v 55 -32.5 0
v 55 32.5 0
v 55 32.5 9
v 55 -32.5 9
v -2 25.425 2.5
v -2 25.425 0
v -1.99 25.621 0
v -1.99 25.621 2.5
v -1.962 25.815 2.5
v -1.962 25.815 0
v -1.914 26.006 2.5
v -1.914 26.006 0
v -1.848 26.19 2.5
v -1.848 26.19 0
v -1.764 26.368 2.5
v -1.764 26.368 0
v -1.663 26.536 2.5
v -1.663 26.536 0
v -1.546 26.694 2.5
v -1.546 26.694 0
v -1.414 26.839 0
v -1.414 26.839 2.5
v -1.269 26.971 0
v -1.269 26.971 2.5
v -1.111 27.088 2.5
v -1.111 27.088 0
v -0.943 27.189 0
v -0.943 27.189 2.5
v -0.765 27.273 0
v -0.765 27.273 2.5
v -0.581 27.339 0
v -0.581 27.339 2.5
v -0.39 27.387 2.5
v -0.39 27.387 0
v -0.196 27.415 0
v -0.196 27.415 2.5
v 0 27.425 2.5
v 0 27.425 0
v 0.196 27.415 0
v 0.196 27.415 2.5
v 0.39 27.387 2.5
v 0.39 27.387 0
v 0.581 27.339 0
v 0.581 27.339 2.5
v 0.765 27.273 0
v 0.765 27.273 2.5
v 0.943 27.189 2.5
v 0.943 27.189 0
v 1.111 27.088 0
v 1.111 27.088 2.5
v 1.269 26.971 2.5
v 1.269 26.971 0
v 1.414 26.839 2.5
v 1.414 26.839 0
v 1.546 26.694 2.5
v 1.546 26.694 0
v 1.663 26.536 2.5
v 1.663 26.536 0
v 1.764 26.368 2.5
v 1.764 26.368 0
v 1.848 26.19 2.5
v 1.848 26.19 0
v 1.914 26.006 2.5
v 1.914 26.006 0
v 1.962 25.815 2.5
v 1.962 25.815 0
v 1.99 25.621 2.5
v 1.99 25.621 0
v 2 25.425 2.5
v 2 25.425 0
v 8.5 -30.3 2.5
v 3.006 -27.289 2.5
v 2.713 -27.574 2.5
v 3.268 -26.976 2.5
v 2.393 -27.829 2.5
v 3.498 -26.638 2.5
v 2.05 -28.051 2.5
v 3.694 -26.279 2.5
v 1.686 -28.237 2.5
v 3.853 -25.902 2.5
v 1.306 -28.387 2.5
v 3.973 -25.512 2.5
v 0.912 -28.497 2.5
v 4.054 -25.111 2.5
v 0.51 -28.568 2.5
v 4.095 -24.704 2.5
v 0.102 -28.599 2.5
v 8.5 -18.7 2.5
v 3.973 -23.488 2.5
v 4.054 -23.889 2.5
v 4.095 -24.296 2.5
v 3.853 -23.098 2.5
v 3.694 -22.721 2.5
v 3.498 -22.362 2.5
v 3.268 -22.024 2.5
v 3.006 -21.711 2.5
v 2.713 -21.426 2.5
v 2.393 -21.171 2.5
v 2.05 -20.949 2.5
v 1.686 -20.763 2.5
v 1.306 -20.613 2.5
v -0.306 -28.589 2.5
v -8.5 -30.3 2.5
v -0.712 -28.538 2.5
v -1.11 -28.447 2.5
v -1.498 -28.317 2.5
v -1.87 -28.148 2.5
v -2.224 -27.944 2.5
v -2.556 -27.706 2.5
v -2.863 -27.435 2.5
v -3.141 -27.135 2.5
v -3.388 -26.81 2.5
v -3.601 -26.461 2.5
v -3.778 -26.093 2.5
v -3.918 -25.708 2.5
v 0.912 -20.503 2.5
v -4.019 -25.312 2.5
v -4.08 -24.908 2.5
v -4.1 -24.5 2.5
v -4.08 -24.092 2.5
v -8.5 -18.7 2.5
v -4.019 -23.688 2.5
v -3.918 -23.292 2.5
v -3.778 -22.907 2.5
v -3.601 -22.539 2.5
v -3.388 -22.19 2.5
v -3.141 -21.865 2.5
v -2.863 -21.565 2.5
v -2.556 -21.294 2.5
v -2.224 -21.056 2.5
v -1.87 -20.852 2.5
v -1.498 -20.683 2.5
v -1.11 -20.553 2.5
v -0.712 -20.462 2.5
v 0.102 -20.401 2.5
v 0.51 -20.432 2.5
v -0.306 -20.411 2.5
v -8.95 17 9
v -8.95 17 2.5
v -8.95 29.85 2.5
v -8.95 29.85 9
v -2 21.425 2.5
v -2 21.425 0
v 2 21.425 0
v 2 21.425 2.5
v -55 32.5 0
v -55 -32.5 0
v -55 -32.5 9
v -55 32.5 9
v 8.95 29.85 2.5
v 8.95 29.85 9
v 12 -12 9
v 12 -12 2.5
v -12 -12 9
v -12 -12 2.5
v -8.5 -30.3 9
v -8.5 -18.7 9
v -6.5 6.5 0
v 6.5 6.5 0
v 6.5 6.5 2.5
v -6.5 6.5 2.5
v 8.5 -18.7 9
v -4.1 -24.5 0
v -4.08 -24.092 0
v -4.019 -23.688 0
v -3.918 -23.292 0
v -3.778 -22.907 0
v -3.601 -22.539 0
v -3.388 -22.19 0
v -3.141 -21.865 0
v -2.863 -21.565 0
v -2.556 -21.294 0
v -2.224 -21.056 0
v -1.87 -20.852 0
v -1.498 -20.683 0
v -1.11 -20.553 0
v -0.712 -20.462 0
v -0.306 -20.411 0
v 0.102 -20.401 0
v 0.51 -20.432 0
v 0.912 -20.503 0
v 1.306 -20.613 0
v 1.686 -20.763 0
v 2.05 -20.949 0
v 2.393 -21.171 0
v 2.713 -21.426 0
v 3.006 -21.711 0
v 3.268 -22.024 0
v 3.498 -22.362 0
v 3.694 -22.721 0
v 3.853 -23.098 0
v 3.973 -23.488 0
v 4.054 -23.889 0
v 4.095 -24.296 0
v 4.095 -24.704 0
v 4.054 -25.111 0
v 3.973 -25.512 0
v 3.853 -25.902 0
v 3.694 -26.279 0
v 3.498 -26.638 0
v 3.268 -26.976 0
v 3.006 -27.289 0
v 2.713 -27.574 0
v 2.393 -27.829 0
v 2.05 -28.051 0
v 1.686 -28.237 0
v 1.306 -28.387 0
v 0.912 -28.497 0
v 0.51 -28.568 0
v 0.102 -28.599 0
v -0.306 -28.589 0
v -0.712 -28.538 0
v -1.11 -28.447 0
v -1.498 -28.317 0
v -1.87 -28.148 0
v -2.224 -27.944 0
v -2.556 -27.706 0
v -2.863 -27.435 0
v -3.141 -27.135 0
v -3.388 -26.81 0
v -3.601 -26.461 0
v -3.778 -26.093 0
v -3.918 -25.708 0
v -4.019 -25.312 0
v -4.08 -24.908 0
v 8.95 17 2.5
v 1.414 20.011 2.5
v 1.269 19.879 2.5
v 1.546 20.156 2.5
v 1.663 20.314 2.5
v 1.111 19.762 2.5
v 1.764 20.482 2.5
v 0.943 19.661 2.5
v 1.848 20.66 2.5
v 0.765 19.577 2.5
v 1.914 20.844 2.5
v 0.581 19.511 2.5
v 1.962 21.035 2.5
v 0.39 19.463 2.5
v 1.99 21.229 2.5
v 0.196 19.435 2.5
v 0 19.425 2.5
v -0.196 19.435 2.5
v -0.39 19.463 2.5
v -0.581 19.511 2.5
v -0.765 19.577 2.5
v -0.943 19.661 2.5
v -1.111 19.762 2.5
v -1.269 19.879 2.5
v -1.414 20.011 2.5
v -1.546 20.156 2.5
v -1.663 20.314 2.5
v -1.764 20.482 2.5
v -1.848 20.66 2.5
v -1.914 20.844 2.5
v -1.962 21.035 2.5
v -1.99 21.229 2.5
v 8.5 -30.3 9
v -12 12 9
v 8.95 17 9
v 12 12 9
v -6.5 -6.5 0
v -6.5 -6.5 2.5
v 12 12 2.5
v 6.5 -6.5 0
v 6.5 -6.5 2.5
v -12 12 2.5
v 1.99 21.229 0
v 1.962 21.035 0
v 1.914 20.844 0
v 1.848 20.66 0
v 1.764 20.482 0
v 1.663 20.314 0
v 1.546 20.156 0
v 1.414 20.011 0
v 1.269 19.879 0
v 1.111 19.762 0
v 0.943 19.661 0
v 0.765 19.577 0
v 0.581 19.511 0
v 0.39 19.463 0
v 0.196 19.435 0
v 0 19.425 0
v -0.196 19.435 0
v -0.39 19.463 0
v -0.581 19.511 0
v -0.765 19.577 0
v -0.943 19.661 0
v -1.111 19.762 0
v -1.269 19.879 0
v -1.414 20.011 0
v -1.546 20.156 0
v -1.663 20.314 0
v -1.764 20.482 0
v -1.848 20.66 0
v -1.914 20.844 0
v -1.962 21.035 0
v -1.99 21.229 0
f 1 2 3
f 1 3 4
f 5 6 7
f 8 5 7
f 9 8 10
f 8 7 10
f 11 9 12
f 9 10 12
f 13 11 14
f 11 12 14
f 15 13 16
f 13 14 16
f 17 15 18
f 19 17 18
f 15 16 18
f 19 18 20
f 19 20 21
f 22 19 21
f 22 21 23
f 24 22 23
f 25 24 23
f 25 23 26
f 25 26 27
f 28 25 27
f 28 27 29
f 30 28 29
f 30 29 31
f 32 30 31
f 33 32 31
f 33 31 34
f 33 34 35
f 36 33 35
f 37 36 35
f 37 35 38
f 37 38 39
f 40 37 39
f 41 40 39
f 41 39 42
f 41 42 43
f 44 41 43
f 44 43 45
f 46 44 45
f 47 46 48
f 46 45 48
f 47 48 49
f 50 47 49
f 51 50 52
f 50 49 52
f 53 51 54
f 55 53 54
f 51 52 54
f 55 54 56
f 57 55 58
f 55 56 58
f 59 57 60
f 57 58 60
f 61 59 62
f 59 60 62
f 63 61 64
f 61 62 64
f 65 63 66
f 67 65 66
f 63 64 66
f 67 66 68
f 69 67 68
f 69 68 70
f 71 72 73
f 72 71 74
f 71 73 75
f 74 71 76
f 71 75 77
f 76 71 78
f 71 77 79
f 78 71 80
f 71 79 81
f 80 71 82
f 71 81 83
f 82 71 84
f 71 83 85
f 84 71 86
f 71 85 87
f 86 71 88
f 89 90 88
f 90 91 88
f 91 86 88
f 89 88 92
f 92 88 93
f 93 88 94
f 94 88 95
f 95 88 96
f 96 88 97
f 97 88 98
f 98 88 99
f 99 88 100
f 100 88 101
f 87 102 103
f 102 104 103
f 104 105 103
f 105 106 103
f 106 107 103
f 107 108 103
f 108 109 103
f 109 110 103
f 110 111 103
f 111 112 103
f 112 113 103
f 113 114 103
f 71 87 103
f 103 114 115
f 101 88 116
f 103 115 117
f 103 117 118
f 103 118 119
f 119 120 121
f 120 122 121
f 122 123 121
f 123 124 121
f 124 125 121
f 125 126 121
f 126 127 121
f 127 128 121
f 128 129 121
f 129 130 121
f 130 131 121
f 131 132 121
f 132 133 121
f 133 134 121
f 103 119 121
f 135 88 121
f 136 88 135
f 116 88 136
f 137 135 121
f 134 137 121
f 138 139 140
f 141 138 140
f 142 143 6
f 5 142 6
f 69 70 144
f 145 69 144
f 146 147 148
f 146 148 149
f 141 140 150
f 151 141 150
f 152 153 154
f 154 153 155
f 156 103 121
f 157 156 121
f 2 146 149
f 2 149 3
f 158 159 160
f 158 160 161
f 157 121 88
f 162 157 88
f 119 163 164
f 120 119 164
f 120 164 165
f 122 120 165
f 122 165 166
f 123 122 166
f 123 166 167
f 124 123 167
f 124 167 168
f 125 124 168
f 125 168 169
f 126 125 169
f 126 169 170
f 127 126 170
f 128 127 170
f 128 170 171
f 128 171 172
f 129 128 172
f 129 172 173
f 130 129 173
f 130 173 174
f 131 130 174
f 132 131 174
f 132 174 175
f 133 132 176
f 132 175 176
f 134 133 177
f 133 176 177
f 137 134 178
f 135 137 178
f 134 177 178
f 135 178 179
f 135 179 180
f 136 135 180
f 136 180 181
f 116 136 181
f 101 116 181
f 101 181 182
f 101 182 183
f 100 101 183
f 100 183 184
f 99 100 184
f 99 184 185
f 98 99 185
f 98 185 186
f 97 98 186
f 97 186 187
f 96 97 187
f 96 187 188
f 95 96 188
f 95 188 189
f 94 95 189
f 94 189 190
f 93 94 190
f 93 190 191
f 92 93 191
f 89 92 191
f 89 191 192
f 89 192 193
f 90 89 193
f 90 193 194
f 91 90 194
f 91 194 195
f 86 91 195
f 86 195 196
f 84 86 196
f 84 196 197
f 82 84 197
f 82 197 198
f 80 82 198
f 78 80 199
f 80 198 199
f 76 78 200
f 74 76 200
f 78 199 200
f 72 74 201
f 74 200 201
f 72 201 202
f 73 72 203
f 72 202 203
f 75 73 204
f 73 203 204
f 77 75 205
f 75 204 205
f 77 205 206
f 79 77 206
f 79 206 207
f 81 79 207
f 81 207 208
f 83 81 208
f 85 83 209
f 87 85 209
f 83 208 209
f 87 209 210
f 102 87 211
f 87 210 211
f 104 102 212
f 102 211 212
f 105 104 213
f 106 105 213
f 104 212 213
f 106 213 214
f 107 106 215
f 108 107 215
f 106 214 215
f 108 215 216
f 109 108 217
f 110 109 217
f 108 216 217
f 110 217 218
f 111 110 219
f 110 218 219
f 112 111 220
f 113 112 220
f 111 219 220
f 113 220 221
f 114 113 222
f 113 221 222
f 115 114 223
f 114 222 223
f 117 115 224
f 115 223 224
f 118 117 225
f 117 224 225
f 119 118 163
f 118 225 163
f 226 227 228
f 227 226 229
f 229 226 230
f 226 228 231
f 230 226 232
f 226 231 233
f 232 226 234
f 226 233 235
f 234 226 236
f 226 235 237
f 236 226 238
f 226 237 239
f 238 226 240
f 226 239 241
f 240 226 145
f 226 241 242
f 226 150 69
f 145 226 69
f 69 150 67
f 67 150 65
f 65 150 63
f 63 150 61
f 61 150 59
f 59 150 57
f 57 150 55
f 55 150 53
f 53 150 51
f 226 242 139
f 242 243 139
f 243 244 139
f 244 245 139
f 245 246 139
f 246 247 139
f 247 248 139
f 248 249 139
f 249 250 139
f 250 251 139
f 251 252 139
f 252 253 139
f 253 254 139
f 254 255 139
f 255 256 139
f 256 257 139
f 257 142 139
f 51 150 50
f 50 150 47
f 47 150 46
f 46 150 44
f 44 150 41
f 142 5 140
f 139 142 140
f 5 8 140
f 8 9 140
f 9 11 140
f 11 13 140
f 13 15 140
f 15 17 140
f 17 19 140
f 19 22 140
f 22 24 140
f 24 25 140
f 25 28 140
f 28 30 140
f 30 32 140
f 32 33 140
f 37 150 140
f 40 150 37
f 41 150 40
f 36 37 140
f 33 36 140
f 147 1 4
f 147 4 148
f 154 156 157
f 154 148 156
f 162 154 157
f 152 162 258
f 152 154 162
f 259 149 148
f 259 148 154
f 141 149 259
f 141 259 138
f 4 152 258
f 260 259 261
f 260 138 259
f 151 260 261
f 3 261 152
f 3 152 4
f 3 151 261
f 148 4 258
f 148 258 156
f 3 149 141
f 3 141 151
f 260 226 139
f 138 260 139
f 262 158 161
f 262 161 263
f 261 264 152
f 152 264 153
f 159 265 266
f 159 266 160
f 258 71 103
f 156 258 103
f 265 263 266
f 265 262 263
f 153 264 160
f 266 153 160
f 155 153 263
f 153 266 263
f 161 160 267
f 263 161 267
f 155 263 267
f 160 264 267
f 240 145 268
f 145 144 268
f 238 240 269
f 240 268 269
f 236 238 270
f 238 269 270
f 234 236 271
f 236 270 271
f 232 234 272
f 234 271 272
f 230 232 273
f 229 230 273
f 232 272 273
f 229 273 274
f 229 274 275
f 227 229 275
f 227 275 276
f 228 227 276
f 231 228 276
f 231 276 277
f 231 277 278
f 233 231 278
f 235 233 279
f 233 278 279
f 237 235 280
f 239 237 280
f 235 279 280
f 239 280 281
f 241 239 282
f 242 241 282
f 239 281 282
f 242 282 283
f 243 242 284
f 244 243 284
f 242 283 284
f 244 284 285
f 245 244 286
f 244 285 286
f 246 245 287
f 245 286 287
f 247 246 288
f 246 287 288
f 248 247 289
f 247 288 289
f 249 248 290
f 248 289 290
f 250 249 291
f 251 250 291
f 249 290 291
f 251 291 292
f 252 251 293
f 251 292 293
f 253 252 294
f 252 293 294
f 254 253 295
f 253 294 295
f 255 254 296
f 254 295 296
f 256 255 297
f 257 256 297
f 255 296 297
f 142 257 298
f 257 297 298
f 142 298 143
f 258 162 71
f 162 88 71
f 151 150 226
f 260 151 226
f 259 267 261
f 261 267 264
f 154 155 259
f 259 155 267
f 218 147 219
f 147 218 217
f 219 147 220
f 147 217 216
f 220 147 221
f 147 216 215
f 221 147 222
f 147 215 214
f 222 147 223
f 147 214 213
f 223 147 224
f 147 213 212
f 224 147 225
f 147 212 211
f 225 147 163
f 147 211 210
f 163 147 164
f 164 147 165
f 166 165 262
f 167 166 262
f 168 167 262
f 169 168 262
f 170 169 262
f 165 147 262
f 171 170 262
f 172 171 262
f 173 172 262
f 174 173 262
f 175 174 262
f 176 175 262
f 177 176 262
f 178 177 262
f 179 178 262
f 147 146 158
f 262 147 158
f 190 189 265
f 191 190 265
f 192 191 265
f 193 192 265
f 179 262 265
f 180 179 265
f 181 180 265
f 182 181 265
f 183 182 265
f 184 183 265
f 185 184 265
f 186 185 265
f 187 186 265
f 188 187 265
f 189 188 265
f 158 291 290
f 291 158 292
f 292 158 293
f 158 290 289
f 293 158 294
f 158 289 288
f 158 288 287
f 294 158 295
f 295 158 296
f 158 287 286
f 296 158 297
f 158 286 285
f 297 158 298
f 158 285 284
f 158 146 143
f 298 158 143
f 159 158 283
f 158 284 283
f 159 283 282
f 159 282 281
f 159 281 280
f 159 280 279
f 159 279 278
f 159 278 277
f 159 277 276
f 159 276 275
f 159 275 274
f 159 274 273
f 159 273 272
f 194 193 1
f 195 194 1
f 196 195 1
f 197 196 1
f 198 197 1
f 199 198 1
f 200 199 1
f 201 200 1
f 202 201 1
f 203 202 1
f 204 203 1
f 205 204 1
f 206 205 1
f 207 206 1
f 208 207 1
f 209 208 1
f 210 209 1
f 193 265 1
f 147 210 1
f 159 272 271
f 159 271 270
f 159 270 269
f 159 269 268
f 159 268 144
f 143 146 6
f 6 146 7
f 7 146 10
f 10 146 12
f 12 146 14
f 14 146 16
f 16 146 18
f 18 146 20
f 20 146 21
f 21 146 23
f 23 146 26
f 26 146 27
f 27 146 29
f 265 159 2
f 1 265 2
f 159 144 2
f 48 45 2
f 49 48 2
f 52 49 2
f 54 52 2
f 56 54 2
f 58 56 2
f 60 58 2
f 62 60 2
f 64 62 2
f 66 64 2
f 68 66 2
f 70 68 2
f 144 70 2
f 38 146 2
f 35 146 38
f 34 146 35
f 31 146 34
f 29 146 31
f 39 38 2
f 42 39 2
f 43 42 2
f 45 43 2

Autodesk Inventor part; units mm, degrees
ref_plane "YZ Plane" through (0, 0, 0) normal (1, 0, 0) x (0, 1, 0)
ref_plane "XZ Plane" through (0, 0, 0) normal (0, 1, 0) x (-1, 0, 0)
ref_plane "XY Plane" through (0, 0, 0) normal (0, 0, 1) x (1, 0, 0)
sketch "Schizzo1" plane through (0, 0, 0) normal (0, 0, 1) x (1, 0, 0)
  line L0 (-55, 32.5) -> (55, 32.5)
  line L1 (55, 32.5) -> (55, -32.5)
  line L2 (55, -32.5) -> (-55, -32.5)
  line L3 (-55, -32.5) -> (-55, 32.5)
  line L4 (-55, 32.5) -> (55, -32.5) construction
  line L5 (55, 32.5) -> (-55, -32.5) construction
  line L6 (-8.5, -18.7) -> (8.5, -18.7)
  line L7 (8.5, -18.7) -> (8.5, -30.3)
  line L8 (8.5, -30.3) -> (-8.5, -30.3)
  line L9 (-8.5, -30.3) -> (-8.5, -18.7)
  line L10 (-8.5, -18.7) -> (8.5, -30.3) construction
  line L11 (8.5, -18.7) -> (-8.5, -30.3) construction
  line L12 (-12, 12) -> (12, 12)
  line L13 (12, 12) -> (12, -12)
  line L14 (12, -12) -> (-12, -12)
  line L15 (-12, -12) -> (-12, 12)
  line L16 (-12, 12) -> (12, -12) construction
  line L17 (12, 12) -> (-12, -12) construction
  line L18 (-8.95, 29.85) -> (8.95, 29.85)
  line L19 (8.95, 29.85) -> (8.95, 17)
  line L20 (8.95, 17) -> (-8.95, 17)
  line L21 (-8.95, 17) -> (-8.95, 29.85)
  line L22 (-8.95, 29.85) -> (8.95, 17) construction
  line L23 (8.95, 29.85) -> (-8.95, 17) construction
  line L24 (0, 25.425) -> (0, 21.425) construction
  line L25 (-2, 25.425) -> (-2, 21.425)
  line L26 (2, 21.425) -> (2, 25.425)
  arc A0 (2, 25.425) -> (-2, 25.425) centre (0, 25.425) ccw
  arc A1 (-2, 21.425) -> (2, 21.425) centre (0, 21.425) ccw
  circle A2 centre (0, -24.5) radius 4.1
  circle A3 centre (0, 0) radius 3.8
  line L27 (-4, 4) -> (4, 4)
  line L28 (4, 4) -> (4, -4)
  line L29 (4, -4) -> (-4, -4)
  line L30 (-4, -4) -> (-4, 4)
  line L31 (-4, 4) -> (4, -4) construction
  line L32 (4, 4) -> (-4, -4) construction
  point P0 (0, 23.425)
  dimension "d0" = 110
  dimension "d1" = 65
  dimension "d5" = 17
  dimension "d6" = 11.6
  dimension "d8" = 24
  dimension "d9" = 24
  dimension "d11" = 17.9
  dimension "d12" = 12.85
  dimension "d13" = 2
  dimension "d14" = 4
  dimension "d15" = 8.2
  dimension "d16" = 7.6
  dimension "d17" = 8
  dimension "d18" = 8
extrude "Estrusione1" add sketch "Schizzo1" along normal blind 9 contours L0 L1 L2 L3
sketch "Schizzo2" plane through (0, 0, 0) normal (0, 0, -1) x (-1, 0, 0)
  line L0 (-55, 32.5) -> (55, 32.5)
  line L1 (55, 32.5) -> (55, -32.5)
  line L2 (55, -32.5) -> (-55, -32.5)
  line L3 (-55, -32.5) -> (-55, 32.5)
  line L4 (-8.5, -18.7) -> (8.5, -18.7)
  line L5 (8.5, -18.7) -> (8.5, -30.3)
  line L6 (8.5, -30.3) -> (-8.5, -30.3)
  line L7 (-8.5, -30.3) -> (-8.5, -18.7)
  line L8 (-8.5, -18.7) -> (8.5, -30.3) construction
  line L9 (8.5, -18.7) -> (-8.5, -30.3) construction
  line L10 (-12, 12) -> (12, 12)
  line L11 (12, 12) -> (12, -12)
  line L12 (12, -12) -> (-12, -12)
  line L13 (-12, -12) -> (-12, 12)
  line L14 (-8.95, 29.85) -> (8.95, 29.85)
  line L15 (8.95, 29.85) -> (8.95, 17)
  line L16 (8.95, 17) -> (-8.95, 17)
  line L17 (-8.95, 17) -> (-8.95, 29.85)
  line L18 (-8.95, 29.85) -> (8.95, 17) construction
  line L19 (8.95, 29.85) -> (-8.95, 17) construction
  line L20 (0, 25.425) -> (0, 21.425) construction
  line L21 (-2, 25.425) -> (-2, 21.425)
  line L22 (2, 21.425) -> (2, 25.425)
  arc A0 (2, 25.425) -> (-2, 25.425) centre (0, 25.425) ccw
  arc A1 (-2, 21.425) -> (2, 21.425) centre (0, 21.425) ccw
  circle A2 centre (0, -24.5) radius 4.1
  line L23 (6.5, -6.5) -> (-6.5, -6.5)
  line L24 (-6.5, -6.5) -> (-6.5, 6.5)
  line L25 (-6.5, 6.5) -> (6.5, 6.5)
  line L26 (6.5, 6.5) -> (6.5, -6.5)
  point P0 (0, 0)
  point P1 (0, 0)
  point P2 (0, 23.425)
  dimension "d21" = 110
  dimension "d22" = 65
  dimension "d23" = 17
  dimension "d24" = 11.6
  dimension "d25" = 24
  dimension "d26" = 24
  dimension "d27" = 17.9
  dimension "d28" = 12.85
  dimension "d29" = 2
  dimension "d30" = 4
  dimension "d31" = 8.2
  dimension "d37" = 13
  dimension "d38" = 13
extrude "Estrusione4" add sketch "Schizzo2" against normal blind 2.5 contours L4 L5 L6 L7 | L10 L11 L12 L13 | L14 L15 L16 L17
